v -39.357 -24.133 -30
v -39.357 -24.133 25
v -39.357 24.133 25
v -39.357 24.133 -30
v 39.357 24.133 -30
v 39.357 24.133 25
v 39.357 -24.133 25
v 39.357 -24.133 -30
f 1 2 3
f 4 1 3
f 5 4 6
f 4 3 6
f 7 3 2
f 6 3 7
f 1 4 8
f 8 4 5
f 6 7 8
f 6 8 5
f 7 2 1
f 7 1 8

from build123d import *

# Parameters (mm, degrees)
F0_W     = 78.714288
F0_H     = 48.265144
F1_DEPTH = 25
F2_DEPTH = 25
F3_DEPTH = 30


with BuildPart() as f1:
    # F0 (on Top) → F1 (new body)
    with BuildSketch(Plane.XY):
        Rectangle(F0_W, F0_H)
    extrude(amount=F1_DEPTH)

    # F0 (on Top) → F2 (join)
    with BuildSketch(Plane.XY):
        Rectangle(F0_W, F0_H)
    extrude(amount=F2_DEPTH)

    # F0 (on Top) → F3 (join)
    with BuildSketch(Plane.XY):
        Rectangle(F0_W, F0_H)
    extrude(amount=-F3_DEPTH)


solid = f1.part
